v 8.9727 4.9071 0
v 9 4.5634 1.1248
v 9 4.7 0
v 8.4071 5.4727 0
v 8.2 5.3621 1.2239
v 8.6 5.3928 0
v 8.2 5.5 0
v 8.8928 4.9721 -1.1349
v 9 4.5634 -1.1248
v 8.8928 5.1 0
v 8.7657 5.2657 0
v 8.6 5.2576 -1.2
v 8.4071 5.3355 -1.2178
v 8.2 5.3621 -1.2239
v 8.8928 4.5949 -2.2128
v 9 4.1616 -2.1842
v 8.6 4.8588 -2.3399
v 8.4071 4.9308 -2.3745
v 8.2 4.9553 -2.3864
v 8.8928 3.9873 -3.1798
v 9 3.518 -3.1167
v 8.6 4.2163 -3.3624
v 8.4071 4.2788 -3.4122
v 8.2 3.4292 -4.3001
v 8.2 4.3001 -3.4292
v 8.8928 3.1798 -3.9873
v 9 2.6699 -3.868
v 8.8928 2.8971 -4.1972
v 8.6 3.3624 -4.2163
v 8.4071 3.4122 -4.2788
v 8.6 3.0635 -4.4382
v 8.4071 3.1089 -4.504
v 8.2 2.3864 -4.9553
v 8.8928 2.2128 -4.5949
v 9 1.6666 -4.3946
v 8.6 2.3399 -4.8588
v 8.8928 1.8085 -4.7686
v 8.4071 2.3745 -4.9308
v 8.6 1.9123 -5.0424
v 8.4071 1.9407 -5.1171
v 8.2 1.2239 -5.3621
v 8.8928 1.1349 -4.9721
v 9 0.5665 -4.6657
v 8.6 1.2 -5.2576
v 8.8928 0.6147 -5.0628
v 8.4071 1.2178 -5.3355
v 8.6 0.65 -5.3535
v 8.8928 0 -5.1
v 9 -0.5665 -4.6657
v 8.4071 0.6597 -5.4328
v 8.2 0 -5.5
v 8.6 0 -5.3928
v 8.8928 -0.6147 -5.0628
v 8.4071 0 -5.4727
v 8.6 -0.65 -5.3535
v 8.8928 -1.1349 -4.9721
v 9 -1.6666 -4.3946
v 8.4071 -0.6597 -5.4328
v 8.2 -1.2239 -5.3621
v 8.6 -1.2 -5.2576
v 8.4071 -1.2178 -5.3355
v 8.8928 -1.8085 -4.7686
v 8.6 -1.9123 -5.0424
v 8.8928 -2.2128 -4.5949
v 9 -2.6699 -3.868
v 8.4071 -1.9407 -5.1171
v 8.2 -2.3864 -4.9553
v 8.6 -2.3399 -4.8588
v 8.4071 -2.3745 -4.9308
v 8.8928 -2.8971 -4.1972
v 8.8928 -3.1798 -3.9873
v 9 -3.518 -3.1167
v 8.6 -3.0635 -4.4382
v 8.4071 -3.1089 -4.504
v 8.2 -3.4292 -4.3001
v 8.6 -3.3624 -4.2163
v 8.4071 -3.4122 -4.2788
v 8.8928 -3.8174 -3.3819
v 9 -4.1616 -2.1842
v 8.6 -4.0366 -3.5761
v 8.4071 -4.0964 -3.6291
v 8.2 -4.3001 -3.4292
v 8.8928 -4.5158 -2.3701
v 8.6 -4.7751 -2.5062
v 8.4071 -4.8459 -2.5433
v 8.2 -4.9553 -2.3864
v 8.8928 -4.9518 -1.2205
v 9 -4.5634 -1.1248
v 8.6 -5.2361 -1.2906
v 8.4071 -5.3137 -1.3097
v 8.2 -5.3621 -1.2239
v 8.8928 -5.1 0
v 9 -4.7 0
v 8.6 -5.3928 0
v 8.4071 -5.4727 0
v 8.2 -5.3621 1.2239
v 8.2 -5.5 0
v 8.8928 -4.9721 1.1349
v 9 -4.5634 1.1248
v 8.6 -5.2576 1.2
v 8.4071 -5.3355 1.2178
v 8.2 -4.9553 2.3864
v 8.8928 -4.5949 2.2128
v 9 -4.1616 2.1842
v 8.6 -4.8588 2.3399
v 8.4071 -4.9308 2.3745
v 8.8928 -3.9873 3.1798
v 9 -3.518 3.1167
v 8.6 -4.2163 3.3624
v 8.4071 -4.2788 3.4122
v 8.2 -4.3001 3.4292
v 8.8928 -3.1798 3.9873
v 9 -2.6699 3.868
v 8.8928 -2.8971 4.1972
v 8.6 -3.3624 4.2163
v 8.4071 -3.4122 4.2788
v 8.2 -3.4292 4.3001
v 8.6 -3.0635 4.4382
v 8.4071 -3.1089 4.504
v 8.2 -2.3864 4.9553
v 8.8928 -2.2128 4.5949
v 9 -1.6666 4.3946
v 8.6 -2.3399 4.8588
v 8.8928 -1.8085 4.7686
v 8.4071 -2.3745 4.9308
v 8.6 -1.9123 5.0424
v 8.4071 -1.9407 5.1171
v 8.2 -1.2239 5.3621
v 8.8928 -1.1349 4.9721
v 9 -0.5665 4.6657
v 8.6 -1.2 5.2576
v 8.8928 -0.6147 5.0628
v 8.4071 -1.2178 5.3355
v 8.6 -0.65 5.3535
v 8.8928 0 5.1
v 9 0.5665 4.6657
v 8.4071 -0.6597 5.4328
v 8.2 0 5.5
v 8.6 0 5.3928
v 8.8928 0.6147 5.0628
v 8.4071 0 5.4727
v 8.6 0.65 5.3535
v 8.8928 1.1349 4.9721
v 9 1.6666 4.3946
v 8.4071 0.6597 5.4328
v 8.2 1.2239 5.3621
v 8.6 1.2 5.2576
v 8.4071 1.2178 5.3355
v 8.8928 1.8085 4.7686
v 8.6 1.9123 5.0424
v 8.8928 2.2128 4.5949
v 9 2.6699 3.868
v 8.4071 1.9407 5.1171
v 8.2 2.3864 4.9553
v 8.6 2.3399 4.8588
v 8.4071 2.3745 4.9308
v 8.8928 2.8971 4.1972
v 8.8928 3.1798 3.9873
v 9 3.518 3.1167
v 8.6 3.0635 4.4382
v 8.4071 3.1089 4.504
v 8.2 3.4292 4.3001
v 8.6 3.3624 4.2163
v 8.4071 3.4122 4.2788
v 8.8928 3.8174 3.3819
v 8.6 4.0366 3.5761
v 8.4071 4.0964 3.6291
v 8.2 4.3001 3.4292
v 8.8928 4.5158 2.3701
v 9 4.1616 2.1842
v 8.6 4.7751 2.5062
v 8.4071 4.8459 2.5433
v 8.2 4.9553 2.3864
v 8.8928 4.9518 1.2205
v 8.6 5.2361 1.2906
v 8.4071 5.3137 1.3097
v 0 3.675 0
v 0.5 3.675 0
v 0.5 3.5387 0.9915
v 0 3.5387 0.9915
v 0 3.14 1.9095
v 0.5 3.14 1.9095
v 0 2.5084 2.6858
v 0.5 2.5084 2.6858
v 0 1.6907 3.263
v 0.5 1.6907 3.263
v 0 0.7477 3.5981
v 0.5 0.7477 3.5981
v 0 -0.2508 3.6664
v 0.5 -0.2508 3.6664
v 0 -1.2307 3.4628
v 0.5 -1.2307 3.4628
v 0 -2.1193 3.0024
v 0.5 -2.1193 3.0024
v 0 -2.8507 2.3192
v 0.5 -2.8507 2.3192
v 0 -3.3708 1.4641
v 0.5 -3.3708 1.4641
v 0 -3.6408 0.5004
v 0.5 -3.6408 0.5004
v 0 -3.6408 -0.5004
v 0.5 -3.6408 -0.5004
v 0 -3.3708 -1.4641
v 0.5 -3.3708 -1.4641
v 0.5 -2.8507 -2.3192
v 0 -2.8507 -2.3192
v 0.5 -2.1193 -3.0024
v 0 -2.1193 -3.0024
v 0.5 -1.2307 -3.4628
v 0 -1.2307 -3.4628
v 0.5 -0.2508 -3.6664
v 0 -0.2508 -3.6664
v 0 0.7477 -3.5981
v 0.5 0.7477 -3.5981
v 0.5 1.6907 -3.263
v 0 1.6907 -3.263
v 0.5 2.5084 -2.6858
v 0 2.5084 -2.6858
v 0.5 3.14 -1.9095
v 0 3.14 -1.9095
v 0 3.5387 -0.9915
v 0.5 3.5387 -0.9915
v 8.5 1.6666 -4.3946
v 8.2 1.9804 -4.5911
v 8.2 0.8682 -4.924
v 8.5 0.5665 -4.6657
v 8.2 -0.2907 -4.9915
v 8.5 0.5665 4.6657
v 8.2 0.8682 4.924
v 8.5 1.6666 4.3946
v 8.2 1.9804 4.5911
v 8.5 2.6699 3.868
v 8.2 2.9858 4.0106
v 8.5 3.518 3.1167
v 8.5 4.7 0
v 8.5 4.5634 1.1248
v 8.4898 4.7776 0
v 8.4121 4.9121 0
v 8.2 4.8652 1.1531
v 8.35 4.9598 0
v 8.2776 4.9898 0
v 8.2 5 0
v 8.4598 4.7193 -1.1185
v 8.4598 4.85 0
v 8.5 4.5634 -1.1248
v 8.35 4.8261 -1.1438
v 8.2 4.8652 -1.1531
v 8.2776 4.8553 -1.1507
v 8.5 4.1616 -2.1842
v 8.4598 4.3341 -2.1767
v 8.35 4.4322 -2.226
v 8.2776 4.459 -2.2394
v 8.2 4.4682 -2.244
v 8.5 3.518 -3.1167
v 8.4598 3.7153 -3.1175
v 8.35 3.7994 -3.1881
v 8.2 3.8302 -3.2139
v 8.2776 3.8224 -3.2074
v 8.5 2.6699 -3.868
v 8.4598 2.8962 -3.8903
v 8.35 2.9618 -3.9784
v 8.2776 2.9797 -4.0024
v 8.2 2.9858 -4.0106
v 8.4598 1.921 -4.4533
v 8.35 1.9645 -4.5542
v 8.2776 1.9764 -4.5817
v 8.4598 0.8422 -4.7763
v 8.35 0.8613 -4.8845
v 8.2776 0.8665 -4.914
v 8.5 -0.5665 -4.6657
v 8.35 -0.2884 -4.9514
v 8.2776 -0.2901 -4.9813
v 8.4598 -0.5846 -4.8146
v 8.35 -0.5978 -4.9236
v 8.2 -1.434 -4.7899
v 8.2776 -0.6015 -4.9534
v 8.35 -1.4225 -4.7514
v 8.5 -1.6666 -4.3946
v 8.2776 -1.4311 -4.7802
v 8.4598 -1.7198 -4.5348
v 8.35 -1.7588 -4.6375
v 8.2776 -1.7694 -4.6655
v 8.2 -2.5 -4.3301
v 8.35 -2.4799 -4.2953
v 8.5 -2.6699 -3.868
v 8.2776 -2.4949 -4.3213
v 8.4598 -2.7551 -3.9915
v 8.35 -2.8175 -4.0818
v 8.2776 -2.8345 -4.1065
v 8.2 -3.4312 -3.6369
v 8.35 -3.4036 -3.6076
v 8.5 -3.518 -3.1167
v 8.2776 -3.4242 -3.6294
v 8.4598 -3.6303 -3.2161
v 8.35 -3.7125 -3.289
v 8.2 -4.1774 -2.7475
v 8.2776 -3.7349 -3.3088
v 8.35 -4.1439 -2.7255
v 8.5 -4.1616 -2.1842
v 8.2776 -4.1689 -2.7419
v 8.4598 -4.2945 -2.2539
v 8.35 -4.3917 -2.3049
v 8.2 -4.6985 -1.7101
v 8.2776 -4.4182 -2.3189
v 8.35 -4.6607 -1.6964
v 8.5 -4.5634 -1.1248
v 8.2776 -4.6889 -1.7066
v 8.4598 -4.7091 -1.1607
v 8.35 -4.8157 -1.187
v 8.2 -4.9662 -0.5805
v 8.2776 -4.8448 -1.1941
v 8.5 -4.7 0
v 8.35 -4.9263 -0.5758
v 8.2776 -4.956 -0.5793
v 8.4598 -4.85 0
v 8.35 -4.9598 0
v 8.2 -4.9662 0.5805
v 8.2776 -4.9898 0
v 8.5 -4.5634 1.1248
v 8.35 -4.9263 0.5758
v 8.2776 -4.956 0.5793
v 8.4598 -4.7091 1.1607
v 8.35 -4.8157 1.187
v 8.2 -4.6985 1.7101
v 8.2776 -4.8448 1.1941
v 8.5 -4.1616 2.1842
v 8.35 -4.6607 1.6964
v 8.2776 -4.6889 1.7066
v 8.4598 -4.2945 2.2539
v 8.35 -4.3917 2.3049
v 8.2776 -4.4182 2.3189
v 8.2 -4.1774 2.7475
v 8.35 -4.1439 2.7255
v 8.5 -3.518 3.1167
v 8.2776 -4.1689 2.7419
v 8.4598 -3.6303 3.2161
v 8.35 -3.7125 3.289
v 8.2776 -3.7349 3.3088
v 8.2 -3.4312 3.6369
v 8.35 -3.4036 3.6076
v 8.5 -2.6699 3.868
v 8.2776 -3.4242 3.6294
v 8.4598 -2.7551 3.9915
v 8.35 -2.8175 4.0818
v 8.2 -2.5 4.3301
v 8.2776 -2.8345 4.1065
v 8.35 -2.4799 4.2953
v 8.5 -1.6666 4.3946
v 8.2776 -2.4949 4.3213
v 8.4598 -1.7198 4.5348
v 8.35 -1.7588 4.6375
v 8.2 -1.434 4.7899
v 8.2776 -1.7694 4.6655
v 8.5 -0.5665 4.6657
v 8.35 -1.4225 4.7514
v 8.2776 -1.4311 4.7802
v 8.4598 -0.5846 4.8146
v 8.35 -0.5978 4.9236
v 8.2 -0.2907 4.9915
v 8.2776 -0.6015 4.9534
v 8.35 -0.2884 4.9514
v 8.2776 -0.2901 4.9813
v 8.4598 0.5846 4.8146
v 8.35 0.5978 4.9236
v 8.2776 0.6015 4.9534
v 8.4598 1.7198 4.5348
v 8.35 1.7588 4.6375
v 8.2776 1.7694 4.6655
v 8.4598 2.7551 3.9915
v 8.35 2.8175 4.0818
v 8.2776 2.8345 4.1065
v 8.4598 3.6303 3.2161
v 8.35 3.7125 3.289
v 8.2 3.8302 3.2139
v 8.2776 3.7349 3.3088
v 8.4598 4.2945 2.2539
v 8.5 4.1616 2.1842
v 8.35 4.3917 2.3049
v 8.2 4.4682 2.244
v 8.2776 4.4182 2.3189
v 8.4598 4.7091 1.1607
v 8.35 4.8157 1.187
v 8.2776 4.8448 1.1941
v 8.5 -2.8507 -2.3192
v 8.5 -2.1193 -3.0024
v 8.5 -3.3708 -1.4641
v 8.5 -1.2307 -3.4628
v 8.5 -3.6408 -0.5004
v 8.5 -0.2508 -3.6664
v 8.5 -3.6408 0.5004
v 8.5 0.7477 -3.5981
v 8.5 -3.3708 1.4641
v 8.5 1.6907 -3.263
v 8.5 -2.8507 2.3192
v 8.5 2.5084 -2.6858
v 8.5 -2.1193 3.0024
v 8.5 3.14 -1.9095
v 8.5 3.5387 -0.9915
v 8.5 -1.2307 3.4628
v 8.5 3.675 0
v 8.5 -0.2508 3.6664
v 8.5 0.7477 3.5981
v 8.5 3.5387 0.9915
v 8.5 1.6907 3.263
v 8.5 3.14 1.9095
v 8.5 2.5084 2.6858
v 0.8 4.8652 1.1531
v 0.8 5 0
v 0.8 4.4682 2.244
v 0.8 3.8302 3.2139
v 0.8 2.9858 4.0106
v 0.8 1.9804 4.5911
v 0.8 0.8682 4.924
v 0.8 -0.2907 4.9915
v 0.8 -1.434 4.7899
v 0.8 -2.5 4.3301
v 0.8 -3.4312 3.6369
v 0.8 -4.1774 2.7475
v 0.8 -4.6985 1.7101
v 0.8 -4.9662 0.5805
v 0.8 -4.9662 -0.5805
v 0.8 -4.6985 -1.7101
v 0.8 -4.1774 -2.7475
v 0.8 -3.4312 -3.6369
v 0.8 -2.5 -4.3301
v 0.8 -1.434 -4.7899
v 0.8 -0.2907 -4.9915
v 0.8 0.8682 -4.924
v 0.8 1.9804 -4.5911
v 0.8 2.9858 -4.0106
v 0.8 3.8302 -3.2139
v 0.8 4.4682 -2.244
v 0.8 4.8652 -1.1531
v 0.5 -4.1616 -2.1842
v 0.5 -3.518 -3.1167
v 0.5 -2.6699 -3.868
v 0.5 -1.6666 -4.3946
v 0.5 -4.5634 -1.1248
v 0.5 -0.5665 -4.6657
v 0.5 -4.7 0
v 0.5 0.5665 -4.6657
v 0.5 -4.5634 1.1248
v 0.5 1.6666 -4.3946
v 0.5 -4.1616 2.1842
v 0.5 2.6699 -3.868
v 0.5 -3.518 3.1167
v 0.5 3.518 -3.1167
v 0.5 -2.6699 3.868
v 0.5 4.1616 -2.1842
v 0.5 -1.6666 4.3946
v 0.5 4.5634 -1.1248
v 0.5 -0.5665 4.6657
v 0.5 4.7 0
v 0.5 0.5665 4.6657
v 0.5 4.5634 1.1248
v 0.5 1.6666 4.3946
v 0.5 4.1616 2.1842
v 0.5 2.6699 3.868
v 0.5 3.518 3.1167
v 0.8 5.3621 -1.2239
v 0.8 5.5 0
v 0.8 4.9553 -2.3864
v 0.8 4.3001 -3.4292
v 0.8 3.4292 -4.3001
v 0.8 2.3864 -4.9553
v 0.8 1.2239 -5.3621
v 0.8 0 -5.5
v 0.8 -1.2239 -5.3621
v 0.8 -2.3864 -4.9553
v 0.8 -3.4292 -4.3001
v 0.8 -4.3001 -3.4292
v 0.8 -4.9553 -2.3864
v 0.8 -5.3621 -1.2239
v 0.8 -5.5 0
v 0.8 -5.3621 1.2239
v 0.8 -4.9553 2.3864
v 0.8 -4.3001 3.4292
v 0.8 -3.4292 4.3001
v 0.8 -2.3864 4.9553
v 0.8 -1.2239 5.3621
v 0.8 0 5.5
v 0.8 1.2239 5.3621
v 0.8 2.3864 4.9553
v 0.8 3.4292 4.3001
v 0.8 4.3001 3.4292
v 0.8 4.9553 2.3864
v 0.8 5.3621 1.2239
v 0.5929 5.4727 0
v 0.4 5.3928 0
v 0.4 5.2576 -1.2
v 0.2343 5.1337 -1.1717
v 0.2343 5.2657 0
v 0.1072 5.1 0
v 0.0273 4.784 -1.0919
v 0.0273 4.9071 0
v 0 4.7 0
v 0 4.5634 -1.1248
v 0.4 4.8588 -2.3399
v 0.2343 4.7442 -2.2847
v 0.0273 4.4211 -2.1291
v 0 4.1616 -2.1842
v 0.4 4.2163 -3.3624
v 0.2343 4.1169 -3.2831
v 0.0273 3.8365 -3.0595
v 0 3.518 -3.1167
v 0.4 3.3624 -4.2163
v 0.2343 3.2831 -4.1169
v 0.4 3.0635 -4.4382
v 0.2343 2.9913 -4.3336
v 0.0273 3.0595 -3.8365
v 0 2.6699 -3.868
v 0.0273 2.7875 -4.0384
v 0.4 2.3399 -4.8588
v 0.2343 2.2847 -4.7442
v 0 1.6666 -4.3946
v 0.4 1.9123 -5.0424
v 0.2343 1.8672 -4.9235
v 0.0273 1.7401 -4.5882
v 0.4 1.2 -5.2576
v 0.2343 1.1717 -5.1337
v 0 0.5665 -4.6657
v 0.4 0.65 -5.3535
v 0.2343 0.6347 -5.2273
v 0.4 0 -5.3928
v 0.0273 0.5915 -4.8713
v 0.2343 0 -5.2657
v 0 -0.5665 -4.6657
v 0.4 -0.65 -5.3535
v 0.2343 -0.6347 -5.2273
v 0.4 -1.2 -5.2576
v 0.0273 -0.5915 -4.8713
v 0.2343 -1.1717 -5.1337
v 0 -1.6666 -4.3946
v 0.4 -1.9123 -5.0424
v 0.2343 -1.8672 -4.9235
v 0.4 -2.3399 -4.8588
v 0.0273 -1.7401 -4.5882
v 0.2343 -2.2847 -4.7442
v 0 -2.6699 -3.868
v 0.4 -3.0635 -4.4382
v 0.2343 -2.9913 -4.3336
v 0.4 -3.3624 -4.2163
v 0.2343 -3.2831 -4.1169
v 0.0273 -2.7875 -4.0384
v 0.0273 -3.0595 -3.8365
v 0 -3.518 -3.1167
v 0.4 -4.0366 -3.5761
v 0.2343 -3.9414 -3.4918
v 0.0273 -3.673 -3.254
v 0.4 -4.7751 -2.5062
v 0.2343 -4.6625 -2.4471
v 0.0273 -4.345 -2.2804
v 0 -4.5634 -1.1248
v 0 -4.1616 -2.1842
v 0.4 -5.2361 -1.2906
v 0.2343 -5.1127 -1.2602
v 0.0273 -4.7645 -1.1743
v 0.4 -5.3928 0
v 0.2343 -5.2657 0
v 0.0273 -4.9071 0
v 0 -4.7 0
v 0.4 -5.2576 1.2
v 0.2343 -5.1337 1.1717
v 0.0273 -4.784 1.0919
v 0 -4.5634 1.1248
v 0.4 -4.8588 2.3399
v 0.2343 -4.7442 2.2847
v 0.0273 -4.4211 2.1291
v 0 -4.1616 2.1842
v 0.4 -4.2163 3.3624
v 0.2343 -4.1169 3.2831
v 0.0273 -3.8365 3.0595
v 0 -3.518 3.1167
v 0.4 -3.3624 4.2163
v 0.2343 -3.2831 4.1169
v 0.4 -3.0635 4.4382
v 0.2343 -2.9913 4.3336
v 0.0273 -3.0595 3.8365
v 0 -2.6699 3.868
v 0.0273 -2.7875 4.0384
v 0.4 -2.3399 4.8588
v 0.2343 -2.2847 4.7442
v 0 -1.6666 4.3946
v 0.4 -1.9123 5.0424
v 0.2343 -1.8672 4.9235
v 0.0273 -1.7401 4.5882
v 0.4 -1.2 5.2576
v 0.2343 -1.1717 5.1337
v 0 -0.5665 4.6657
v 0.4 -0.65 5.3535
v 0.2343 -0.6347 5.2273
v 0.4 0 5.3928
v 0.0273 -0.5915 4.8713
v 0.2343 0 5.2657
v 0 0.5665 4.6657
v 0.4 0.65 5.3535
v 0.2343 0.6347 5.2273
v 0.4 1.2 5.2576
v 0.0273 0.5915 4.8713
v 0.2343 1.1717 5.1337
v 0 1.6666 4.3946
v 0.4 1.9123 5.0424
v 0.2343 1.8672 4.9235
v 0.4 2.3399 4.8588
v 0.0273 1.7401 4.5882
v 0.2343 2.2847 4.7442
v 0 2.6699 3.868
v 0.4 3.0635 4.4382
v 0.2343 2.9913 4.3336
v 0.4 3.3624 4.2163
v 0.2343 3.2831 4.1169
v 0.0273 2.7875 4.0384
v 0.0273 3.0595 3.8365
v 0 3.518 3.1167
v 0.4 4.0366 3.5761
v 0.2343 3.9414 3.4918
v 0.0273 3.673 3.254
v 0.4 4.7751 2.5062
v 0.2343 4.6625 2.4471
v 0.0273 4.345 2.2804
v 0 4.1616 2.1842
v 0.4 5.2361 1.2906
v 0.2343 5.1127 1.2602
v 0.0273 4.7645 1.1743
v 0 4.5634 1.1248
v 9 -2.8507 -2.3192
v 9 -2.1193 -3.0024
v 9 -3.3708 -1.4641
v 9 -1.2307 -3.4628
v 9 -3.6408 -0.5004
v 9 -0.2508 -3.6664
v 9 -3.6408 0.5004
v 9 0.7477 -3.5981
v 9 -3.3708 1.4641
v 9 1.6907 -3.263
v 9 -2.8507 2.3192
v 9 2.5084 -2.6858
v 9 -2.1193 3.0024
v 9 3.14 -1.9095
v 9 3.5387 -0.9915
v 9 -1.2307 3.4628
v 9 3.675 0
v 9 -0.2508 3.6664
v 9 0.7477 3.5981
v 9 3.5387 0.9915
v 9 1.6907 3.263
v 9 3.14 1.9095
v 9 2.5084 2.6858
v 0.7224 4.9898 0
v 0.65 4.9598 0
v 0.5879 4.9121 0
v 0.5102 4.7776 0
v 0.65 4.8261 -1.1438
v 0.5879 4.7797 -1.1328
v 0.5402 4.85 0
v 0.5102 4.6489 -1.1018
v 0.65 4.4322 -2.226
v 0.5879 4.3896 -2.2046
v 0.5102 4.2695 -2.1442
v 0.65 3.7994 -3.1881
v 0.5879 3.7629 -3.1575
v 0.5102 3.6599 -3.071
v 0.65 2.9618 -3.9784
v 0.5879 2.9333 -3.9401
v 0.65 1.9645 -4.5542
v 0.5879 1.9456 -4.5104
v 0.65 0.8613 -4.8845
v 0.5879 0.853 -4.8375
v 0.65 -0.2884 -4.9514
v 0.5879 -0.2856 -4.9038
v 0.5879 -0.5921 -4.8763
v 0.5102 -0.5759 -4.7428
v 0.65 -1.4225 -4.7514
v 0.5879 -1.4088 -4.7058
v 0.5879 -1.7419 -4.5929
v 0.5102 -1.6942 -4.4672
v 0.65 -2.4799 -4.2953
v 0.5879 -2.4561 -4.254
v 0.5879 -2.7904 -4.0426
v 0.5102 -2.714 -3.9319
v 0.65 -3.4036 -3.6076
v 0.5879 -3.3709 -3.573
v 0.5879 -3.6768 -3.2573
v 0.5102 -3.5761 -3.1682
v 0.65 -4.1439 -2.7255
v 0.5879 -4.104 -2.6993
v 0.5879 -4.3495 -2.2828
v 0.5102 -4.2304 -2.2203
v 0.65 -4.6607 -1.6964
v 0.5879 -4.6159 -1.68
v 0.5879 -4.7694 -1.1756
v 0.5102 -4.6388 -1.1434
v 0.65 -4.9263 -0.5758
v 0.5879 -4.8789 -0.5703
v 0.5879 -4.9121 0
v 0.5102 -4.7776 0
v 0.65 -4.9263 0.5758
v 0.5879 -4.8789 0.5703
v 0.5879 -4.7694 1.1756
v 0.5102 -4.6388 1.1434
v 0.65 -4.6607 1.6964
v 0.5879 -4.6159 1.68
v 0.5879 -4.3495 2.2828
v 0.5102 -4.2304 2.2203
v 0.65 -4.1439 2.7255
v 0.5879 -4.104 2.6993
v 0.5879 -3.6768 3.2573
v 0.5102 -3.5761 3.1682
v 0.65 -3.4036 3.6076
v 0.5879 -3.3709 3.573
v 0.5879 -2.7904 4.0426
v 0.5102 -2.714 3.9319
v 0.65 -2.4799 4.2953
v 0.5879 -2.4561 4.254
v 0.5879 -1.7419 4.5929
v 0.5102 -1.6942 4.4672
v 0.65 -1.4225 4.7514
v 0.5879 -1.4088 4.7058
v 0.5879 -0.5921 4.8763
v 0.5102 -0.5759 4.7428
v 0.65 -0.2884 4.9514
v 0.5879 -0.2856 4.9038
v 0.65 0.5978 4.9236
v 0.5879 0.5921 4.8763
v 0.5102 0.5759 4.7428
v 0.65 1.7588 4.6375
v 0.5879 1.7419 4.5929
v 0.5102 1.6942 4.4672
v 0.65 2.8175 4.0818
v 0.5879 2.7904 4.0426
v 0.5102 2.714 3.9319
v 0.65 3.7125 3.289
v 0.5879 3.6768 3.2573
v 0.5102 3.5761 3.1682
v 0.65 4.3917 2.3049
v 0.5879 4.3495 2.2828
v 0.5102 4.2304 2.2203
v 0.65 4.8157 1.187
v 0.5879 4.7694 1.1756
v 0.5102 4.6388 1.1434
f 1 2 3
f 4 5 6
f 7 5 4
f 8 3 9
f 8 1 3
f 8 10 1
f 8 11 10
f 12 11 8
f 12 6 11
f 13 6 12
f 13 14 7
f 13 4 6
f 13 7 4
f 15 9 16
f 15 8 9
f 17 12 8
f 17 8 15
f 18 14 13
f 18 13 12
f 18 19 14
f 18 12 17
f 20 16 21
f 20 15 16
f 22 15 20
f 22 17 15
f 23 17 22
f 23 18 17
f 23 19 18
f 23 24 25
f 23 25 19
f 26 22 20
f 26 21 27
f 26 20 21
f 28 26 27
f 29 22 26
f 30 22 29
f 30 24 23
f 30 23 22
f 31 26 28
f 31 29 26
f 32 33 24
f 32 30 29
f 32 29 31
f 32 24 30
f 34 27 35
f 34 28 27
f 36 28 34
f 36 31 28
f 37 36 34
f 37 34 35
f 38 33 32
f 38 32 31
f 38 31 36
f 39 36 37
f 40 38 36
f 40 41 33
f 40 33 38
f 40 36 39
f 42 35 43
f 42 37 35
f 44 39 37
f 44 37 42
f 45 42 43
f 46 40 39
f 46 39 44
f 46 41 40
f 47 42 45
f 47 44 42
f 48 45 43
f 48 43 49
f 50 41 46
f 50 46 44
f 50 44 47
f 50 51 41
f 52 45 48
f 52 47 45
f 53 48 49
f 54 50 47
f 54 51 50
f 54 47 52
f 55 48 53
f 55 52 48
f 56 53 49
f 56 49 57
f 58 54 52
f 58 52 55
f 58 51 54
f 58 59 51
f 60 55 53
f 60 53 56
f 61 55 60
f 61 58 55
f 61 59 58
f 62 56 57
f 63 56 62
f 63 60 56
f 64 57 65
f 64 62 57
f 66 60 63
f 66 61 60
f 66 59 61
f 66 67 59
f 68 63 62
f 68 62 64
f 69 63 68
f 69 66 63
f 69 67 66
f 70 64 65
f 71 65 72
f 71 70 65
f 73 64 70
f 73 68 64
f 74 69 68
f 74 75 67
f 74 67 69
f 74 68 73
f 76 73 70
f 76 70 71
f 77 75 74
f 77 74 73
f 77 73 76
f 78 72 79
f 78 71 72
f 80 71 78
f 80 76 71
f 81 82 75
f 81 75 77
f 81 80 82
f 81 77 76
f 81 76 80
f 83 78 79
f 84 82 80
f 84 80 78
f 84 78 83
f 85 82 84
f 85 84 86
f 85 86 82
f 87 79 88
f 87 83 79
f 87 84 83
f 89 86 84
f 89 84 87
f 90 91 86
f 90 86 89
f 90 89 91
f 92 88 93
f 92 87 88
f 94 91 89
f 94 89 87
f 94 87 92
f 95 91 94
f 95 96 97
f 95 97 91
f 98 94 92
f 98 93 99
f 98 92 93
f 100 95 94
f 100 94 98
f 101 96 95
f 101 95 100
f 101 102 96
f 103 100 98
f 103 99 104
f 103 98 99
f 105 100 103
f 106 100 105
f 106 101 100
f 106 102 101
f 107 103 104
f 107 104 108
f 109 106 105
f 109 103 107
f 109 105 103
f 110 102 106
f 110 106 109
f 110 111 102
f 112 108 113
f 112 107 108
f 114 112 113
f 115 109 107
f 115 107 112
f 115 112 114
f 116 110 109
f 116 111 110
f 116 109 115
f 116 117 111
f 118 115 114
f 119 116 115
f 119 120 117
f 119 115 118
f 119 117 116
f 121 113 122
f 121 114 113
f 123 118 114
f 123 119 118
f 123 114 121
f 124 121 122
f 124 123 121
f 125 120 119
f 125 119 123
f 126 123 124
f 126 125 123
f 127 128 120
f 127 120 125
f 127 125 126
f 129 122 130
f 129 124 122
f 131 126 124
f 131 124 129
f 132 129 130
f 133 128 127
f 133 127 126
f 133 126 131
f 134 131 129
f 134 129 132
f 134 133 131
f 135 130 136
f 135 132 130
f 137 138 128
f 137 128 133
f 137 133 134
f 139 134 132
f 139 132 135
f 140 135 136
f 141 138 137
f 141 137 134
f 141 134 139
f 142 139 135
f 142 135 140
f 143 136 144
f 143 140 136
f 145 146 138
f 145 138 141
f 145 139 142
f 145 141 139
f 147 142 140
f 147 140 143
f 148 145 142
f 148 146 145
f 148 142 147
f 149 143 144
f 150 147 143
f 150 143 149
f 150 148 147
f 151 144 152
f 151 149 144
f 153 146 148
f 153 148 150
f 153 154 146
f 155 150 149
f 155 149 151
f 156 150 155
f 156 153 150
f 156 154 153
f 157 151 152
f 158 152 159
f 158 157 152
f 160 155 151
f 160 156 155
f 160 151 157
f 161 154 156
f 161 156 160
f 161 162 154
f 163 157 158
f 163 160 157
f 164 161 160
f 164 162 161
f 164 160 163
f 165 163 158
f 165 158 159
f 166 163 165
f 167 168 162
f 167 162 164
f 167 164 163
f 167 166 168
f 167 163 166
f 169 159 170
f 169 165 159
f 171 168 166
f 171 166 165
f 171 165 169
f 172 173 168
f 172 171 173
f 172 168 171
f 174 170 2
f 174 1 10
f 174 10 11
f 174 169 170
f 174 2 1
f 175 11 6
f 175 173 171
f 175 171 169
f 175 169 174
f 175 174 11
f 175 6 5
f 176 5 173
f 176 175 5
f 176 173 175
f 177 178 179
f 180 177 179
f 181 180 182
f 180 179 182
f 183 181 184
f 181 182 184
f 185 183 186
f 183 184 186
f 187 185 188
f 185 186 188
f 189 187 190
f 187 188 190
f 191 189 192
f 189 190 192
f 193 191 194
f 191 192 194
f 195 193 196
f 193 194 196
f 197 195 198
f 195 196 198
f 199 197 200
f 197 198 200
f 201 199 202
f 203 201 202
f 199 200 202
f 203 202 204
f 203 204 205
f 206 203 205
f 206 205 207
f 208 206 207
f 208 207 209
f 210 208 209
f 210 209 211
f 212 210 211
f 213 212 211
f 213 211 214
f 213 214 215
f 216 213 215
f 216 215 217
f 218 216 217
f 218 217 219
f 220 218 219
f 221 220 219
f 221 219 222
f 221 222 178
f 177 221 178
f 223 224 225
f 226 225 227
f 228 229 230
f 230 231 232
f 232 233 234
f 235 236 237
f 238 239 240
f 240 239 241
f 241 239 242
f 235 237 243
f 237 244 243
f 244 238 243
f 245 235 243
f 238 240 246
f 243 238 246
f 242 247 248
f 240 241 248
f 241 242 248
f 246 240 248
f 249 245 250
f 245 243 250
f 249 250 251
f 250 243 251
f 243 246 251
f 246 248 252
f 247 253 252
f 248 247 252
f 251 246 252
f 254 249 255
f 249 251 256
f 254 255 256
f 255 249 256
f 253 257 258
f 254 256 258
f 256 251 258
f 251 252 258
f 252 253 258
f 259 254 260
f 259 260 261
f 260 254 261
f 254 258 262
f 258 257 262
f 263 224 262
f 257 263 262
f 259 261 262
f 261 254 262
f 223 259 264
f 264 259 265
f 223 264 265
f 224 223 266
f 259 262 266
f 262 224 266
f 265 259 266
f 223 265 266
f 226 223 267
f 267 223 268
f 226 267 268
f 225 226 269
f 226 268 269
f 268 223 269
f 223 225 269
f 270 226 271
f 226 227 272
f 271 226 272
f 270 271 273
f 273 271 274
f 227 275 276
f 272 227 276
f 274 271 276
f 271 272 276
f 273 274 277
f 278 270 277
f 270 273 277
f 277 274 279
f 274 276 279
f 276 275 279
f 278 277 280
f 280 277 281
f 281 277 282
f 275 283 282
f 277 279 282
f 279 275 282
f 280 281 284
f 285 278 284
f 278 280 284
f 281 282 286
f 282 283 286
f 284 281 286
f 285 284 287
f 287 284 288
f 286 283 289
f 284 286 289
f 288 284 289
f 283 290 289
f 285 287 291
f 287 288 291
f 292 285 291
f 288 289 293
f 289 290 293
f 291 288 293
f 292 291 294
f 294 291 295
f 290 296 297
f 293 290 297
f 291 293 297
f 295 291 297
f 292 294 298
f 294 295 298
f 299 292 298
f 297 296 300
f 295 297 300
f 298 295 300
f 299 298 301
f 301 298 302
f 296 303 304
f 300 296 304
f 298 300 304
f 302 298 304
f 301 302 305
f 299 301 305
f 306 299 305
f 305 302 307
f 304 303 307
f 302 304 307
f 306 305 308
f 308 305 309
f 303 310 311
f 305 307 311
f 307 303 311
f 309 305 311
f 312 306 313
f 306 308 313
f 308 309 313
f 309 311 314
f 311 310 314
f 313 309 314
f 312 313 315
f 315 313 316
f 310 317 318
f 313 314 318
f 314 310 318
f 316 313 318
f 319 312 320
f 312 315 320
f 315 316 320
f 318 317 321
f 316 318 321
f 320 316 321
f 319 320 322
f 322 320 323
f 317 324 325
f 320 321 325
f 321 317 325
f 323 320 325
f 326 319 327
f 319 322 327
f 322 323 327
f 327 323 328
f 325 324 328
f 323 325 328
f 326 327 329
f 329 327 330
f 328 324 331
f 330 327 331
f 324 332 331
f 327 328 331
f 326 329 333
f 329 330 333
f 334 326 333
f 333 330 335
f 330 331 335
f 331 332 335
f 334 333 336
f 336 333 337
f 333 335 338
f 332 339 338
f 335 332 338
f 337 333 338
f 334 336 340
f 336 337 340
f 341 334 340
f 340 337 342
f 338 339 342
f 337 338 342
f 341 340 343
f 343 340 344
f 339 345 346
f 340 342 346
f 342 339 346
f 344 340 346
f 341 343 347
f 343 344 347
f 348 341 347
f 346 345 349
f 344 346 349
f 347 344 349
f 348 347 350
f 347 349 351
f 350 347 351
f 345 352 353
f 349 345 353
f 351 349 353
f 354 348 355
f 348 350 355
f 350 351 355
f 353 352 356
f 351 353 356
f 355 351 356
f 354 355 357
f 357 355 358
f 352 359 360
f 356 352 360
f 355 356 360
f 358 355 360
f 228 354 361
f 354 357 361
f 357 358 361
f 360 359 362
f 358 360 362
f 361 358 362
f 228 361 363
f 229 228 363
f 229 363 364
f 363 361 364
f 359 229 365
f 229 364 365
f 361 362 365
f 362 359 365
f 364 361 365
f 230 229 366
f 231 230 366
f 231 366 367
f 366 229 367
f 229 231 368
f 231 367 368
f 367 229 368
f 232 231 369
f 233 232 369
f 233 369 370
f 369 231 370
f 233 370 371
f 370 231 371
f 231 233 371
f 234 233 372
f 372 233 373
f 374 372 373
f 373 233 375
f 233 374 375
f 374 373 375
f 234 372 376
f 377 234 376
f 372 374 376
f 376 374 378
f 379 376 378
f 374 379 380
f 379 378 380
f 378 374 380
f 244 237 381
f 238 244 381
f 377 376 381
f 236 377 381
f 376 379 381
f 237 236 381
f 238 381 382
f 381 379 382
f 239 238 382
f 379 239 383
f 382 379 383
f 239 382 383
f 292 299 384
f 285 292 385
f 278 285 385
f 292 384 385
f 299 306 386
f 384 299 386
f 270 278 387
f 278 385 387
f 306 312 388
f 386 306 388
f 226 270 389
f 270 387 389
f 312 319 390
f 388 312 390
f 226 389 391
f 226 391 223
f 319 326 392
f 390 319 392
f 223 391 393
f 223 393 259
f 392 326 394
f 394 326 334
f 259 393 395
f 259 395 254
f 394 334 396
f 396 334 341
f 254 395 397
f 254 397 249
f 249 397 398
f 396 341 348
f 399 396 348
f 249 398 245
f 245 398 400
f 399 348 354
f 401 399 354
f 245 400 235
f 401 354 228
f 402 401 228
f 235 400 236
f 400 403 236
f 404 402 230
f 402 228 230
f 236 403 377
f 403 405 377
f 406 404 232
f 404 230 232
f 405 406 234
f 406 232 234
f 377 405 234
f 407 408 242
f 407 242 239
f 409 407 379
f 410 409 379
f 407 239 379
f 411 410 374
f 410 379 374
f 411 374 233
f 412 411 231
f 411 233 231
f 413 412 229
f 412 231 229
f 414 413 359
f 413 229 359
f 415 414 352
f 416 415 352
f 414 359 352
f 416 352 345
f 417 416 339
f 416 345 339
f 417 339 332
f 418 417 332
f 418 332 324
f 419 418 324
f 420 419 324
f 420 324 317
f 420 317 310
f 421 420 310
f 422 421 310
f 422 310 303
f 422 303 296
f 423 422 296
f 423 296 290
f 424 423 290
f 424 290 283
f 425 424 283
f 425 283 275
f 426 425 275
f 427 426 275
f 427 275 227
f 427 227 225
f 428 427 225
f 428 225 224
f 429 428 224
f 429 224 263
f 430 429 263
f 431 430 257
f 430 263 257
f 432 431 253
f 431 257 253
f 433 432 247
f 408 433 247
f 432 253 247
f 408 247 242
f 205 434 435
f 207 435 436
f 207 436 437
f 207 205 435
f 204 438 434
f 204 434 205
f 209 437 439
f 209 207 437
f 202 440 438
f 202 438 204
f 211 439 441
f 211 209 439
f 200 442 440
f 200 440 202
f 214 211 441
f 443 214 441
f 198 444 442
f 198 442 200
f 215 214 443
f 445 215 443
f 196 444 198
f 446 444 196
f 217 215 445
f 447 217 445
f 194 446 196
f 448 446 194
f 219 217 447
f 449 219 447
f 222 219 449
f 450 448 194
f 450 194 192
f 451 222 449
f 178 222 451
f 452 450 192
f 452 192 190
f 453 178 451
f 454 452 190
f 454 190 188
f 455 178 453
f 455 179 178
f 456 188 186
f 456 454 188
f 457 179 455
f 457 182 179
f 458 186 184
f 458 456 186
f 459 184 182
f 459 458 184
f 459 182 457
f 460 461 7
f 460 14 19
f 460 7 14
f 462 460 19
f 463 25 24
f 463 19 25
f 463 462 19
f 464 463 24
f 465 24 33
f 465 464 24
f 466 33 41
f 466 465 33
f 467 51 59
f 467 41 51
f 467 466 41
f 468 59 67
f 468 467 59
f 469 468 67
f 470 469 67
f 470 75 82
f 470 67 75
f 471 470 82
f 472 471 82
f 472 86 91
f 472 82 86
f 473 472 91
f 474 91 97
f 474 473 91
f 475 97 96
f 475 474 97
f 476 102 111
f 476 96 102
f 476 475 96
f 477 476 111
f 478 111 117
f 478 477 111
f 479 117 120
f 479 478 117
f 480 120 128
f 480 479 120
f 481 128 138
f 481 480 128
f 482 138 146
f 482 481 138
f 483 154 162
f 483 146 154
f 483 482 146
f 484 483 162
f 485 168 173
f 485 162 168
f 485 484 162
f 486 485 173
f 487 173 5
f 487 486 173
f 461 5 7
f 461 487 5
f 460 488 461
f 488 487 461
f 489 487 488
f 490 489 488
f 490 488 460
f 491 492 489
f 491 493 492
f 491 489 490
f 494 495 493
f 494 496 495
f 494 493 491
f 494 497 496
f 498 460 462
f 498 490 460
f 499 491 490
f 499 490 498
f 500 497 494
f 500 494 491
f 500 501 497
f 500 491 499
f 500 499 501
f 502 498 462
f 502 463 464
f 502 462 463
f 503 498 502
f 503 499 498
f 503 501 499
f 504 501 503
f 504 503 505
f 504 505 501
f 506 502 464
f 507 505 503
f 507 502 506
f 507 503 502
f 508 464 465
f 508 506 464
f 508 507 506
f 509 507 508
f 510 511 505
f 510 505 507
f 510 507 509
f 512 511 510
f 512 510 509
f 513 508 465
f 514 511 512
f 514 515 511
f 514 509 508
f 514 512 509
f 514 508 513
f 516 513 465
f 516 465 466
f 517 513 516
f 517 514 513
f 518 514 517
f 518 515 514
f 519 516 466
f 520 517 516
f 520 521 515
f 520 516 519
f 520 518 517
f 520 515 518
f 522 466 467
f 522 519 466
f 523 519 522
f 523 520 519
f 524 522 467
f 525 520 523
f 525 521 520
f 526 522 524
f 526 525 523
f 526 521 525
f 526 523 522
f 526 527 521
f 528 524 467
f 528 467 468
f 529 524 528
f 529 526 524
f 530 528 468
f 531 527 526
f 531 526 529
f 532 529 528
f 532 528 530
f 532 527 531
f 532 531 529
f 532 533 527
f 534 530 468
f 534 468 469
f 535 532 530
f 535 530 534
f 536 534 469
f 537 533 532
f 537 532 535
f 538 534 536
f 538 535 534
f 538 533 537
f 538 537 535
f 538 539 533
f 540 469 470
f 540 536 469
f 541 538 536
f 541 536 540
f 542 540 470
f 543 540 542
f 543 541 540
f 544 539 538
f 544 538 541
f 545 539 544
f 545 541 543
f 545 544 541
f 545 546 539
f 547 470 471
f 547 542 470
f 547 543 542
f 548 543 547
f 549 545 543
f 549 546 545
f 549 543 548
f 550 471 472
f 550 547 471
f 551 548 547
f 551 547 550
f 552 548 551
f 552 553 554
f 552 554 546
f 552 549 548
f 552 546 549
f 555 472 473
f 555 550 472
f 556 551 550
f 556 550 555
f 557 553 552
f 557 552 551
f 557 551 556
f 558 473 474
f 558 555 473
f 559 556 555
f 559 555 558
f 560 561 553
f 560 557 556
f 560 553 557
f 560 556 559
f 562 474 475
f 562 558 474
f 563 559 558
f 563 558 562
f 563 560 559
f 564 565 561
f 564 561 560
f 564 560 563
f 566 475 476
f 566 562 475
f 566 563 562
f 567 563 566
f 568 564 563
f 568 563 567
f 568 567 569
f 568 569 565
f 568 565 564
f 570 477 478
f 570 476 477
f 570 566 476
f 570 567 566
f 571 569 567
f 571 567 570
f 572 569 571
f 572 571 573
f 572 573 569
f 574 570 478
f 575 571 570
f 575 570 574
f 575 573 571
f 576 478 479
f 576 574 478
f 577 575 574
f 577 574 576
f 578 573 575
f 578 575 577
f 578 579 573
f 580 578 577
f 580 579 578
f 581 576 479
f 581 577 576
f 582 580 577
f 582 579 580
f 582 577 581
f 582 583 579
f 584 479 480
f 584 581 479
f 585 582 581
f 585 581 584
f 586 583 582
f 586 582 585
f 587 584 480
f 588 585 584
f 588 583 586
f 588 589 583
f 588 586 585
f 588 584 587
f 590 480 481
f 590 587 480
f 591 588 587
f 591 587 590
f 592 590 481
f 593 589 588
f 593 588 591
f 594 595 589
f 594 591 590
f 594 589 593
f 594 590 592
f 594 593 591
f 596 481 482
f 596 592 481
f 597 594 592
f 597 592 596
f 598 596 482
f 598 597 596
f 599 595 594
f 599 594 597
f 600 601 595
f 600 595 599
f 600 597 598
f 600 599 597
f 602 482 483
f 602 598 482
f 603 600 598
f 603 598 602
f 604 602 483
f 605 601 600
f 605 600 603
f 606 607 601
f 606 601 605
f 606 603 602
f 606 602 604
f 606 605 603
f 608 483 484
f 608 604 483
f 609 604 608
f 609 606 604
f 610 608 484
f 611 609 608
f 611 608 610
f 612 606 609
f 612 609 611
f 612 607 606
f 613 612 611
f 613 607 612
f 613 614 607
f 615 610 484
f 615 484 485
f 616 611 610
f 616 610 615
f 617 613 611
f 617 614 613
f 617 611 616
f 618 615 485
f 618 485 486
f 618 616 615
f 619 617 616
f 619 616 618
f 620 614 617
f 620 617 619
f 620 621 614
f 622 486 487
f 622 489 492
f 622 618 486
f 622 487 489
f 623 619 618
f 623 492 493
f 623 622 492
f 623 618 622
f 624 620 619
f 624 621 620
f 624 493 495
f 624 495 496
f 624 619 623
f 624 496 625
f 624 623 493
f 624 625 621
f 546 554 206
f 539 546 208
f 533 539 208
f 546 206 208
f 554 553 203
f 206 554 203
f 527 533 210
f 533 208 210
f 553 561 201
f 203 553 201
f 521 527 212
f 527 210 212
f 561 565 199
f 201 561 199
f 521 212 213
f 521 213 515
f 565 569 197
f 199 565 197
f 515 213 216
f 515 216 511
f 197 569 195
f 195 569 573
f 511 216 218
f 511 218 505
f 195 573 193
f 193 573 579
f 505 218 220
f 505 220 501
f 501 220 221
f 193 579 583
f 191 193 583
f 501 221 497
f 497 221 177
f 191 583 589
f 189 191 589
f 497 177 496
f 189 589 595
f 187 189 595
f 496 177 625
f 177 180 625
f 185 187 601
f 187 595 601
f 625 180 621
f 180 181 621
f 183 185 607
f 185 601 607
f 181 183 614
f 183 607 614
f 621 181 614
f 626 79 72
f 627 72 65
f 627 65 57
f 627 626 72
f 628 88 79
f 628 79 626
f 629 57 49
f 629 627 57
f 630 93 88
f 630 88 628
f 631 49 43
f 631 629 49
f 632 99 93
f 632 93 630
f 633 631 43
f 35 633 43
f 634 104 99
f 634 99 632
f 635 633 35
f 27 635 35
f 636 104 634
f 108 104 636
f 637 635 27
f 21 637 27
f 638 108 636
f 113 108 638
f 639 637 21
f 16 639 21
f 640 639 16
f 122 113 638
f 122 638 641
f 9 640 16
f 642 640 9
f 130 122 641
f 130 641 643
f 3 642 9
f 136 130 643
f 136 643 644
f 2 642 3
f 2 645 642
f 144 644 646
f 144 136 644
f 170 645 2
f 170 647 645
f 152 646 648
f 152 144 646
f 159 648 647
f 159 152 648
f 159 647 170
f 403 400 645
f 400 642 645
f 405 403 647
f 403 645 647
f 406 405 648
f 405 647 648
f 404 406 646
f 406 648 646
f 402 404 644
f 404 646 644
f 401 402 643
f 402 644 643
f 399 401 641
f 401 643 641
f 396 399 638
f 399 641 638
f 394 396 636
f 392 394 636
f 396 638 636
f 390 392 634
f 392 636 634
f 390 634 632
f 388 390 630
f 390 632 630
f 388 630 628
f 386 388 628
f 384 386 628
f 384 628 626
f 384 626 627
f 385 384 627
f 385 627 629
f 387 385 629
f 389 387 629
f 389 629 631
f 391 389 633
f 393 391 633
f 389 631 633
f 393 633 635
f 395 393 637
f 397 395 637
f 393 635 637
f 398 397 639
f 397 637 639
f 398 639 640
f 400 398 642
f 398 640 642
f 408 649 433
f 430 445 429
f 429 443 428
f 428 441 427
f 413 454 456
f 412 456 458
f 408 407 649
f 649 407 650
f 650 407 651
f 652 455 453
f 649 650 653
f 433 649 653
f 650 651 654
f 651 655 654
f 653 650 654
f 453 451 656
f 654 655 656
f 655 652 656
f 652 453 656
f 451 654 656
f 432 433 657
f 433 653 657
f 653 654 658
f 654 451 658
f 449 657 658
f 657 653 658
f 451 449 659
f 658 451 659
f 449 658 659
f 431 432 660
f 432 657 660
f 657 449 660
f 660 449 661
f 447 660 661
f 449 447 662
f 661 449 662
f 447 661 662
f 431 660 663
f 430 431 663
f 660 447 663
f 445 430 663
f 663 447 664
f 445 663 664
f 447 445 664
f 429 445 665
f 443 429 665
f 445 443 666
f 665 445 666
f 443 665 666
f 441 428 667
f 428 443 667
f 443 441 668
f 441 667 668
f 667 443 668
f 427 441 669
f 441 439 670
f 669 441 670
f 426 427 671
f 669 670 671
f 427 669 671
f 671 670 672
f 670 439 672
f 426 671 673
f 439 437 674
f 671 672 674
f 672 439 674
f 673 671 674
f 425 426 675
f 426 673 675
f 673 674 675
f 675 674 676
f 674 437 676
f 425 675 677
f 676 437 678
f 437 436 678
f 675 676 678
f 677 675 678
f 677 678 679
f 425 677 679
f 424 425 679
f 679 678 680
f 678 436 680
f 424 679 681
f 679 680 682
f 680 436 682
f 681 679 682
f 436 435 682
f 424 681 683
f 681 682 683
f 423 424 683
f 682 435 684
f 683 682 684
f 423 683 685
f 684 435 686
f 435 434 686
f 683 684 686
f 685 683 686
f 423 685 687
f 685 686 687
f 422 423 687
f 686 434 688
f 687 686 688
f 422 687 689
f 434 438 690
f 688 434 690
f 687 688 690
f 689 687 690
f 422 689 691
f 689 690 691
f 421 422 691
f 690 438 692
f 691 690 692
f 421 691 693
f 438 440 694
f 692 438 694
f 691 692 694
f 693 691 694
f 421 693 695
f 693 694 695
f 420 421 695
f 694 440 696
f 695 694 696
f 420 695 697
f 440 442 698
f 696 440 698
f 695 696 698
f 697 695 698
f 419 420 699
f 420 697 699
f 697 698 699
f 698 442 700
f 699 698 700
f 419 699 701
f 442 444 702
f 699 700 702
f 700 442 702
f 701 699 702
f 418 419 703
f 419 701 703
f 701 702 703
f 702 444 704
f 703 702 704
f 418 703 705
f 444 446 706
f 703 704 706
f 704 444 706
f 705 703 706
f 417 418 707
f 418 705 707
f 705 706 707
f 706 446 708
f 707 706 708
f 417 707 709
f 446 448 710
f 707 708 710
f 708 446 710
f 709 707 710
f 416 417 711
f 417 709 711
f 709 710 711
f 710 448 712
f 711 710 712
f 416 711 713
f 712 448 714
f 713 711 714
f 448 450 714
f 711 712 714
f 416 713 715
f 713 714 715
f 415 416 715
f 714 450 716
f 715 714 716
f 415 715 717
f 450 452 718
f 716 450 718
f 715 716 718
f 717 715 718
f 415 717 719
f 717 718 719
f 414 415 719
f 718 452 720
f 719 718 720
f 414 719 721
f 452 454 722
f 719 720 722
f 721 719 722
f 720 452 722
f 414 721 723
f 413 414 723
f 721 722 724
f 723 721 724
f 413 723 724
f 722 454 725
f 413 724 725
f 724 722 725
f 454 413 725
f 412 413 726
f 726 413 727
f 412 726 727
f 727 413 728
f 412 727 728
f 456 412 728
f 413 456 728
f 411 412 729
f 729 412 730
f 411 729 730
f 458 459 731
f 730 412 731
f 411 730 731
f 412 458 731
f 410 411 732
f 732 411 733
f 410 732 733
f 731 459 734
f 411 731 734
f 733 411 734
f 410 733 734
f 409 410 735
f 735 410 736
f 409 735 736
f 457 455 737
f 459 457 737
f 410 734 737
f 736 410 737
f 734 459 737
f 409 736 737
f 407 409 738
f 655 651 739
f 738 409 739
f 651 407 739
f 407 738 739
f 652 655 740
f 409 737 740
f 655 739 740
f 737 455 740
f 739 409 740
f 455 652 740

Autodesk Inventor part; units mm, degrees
sketch "Sketch_1" plane through (0, 0, 0) normal (0, 0, 1) x (1, 0, 0)
  line L0 (9, 0) -> (0, 0)
  line L1 (0, 3.675) -> (0.5, 3.675)
  line L2 (0.5, 3.675) -> (0.5, 4.7)
  arc A0 (0.8, 5) -> (0.5, 4.7) centre (0.8, 4.7) ccw
  line L3 (0.8, 5) -> (8.2, 5)
  arc A1 (8.5, 4.7) -> (8.2, 5) centre (8.2, 4.7) ccw
  line L4 (8.5, 4.7) -> (8.5, 3.675)
  line L5 (8.5, 3.675) -> (9, 3.675)
  line L6 (9, 3.675) -> (9, 4.7)
  arc A2 (9, 4.7) -> (8.2, 5.5) centre (8.2, 4.7) ccw
  line L7 (8.2, 5.5) -> (0.8, 5.5)
  arc A3 (0.8, 5.5) -> (0, 4.7) centre (0.8, 4.7) ccw
  line L8 (0, 4.7) -> (0, 3.675)
revolve "Revolution1" add sketch "Sketch_1" angle 360 about axis through (9, 0, 0) along (1, 0, 0)
ref_plane "IP_1_XY" through (0, 0, 0) normal (1, 0, 0) x (0, 0, -1)
ref_plane "IP_1_YZ" through (0, 0, 0) normal (0, 0, -1) x (0, 1, 0)
ref_plane "IP_1_ZX" through (0, 0, 0) normal (0, 1, 0) x (1, 0, 0)
ref_plane "IP_5_XY" through (4.5, 0, 0) normal (1, 0, 0) x (0, 0, -1)
ref_plane "IP_5_YZ" through (4.5, 0, 0) normal (0, 0, -1) x (0, 1, 0)
ref_plane "IP_5_ZX" through (4.5, 0, 0) normal (0, 1, 0) x (1, 0, 0)
ref_plane "IP_6_XY" through (6.35, 0, 0) normal (1, 0, 0) x (0, 0, -1)
ref_plane "IP_6_YZ" through (6.35, 0, 0) normal (0, 0, -1) x (0, 1, 0)
ref_plane "IP_6_ZX" through (6.35, 0, 0) normal (0, 1, 0) x (1, 0, 0)
properties part number "HK0709FMSH" material "Steel"
